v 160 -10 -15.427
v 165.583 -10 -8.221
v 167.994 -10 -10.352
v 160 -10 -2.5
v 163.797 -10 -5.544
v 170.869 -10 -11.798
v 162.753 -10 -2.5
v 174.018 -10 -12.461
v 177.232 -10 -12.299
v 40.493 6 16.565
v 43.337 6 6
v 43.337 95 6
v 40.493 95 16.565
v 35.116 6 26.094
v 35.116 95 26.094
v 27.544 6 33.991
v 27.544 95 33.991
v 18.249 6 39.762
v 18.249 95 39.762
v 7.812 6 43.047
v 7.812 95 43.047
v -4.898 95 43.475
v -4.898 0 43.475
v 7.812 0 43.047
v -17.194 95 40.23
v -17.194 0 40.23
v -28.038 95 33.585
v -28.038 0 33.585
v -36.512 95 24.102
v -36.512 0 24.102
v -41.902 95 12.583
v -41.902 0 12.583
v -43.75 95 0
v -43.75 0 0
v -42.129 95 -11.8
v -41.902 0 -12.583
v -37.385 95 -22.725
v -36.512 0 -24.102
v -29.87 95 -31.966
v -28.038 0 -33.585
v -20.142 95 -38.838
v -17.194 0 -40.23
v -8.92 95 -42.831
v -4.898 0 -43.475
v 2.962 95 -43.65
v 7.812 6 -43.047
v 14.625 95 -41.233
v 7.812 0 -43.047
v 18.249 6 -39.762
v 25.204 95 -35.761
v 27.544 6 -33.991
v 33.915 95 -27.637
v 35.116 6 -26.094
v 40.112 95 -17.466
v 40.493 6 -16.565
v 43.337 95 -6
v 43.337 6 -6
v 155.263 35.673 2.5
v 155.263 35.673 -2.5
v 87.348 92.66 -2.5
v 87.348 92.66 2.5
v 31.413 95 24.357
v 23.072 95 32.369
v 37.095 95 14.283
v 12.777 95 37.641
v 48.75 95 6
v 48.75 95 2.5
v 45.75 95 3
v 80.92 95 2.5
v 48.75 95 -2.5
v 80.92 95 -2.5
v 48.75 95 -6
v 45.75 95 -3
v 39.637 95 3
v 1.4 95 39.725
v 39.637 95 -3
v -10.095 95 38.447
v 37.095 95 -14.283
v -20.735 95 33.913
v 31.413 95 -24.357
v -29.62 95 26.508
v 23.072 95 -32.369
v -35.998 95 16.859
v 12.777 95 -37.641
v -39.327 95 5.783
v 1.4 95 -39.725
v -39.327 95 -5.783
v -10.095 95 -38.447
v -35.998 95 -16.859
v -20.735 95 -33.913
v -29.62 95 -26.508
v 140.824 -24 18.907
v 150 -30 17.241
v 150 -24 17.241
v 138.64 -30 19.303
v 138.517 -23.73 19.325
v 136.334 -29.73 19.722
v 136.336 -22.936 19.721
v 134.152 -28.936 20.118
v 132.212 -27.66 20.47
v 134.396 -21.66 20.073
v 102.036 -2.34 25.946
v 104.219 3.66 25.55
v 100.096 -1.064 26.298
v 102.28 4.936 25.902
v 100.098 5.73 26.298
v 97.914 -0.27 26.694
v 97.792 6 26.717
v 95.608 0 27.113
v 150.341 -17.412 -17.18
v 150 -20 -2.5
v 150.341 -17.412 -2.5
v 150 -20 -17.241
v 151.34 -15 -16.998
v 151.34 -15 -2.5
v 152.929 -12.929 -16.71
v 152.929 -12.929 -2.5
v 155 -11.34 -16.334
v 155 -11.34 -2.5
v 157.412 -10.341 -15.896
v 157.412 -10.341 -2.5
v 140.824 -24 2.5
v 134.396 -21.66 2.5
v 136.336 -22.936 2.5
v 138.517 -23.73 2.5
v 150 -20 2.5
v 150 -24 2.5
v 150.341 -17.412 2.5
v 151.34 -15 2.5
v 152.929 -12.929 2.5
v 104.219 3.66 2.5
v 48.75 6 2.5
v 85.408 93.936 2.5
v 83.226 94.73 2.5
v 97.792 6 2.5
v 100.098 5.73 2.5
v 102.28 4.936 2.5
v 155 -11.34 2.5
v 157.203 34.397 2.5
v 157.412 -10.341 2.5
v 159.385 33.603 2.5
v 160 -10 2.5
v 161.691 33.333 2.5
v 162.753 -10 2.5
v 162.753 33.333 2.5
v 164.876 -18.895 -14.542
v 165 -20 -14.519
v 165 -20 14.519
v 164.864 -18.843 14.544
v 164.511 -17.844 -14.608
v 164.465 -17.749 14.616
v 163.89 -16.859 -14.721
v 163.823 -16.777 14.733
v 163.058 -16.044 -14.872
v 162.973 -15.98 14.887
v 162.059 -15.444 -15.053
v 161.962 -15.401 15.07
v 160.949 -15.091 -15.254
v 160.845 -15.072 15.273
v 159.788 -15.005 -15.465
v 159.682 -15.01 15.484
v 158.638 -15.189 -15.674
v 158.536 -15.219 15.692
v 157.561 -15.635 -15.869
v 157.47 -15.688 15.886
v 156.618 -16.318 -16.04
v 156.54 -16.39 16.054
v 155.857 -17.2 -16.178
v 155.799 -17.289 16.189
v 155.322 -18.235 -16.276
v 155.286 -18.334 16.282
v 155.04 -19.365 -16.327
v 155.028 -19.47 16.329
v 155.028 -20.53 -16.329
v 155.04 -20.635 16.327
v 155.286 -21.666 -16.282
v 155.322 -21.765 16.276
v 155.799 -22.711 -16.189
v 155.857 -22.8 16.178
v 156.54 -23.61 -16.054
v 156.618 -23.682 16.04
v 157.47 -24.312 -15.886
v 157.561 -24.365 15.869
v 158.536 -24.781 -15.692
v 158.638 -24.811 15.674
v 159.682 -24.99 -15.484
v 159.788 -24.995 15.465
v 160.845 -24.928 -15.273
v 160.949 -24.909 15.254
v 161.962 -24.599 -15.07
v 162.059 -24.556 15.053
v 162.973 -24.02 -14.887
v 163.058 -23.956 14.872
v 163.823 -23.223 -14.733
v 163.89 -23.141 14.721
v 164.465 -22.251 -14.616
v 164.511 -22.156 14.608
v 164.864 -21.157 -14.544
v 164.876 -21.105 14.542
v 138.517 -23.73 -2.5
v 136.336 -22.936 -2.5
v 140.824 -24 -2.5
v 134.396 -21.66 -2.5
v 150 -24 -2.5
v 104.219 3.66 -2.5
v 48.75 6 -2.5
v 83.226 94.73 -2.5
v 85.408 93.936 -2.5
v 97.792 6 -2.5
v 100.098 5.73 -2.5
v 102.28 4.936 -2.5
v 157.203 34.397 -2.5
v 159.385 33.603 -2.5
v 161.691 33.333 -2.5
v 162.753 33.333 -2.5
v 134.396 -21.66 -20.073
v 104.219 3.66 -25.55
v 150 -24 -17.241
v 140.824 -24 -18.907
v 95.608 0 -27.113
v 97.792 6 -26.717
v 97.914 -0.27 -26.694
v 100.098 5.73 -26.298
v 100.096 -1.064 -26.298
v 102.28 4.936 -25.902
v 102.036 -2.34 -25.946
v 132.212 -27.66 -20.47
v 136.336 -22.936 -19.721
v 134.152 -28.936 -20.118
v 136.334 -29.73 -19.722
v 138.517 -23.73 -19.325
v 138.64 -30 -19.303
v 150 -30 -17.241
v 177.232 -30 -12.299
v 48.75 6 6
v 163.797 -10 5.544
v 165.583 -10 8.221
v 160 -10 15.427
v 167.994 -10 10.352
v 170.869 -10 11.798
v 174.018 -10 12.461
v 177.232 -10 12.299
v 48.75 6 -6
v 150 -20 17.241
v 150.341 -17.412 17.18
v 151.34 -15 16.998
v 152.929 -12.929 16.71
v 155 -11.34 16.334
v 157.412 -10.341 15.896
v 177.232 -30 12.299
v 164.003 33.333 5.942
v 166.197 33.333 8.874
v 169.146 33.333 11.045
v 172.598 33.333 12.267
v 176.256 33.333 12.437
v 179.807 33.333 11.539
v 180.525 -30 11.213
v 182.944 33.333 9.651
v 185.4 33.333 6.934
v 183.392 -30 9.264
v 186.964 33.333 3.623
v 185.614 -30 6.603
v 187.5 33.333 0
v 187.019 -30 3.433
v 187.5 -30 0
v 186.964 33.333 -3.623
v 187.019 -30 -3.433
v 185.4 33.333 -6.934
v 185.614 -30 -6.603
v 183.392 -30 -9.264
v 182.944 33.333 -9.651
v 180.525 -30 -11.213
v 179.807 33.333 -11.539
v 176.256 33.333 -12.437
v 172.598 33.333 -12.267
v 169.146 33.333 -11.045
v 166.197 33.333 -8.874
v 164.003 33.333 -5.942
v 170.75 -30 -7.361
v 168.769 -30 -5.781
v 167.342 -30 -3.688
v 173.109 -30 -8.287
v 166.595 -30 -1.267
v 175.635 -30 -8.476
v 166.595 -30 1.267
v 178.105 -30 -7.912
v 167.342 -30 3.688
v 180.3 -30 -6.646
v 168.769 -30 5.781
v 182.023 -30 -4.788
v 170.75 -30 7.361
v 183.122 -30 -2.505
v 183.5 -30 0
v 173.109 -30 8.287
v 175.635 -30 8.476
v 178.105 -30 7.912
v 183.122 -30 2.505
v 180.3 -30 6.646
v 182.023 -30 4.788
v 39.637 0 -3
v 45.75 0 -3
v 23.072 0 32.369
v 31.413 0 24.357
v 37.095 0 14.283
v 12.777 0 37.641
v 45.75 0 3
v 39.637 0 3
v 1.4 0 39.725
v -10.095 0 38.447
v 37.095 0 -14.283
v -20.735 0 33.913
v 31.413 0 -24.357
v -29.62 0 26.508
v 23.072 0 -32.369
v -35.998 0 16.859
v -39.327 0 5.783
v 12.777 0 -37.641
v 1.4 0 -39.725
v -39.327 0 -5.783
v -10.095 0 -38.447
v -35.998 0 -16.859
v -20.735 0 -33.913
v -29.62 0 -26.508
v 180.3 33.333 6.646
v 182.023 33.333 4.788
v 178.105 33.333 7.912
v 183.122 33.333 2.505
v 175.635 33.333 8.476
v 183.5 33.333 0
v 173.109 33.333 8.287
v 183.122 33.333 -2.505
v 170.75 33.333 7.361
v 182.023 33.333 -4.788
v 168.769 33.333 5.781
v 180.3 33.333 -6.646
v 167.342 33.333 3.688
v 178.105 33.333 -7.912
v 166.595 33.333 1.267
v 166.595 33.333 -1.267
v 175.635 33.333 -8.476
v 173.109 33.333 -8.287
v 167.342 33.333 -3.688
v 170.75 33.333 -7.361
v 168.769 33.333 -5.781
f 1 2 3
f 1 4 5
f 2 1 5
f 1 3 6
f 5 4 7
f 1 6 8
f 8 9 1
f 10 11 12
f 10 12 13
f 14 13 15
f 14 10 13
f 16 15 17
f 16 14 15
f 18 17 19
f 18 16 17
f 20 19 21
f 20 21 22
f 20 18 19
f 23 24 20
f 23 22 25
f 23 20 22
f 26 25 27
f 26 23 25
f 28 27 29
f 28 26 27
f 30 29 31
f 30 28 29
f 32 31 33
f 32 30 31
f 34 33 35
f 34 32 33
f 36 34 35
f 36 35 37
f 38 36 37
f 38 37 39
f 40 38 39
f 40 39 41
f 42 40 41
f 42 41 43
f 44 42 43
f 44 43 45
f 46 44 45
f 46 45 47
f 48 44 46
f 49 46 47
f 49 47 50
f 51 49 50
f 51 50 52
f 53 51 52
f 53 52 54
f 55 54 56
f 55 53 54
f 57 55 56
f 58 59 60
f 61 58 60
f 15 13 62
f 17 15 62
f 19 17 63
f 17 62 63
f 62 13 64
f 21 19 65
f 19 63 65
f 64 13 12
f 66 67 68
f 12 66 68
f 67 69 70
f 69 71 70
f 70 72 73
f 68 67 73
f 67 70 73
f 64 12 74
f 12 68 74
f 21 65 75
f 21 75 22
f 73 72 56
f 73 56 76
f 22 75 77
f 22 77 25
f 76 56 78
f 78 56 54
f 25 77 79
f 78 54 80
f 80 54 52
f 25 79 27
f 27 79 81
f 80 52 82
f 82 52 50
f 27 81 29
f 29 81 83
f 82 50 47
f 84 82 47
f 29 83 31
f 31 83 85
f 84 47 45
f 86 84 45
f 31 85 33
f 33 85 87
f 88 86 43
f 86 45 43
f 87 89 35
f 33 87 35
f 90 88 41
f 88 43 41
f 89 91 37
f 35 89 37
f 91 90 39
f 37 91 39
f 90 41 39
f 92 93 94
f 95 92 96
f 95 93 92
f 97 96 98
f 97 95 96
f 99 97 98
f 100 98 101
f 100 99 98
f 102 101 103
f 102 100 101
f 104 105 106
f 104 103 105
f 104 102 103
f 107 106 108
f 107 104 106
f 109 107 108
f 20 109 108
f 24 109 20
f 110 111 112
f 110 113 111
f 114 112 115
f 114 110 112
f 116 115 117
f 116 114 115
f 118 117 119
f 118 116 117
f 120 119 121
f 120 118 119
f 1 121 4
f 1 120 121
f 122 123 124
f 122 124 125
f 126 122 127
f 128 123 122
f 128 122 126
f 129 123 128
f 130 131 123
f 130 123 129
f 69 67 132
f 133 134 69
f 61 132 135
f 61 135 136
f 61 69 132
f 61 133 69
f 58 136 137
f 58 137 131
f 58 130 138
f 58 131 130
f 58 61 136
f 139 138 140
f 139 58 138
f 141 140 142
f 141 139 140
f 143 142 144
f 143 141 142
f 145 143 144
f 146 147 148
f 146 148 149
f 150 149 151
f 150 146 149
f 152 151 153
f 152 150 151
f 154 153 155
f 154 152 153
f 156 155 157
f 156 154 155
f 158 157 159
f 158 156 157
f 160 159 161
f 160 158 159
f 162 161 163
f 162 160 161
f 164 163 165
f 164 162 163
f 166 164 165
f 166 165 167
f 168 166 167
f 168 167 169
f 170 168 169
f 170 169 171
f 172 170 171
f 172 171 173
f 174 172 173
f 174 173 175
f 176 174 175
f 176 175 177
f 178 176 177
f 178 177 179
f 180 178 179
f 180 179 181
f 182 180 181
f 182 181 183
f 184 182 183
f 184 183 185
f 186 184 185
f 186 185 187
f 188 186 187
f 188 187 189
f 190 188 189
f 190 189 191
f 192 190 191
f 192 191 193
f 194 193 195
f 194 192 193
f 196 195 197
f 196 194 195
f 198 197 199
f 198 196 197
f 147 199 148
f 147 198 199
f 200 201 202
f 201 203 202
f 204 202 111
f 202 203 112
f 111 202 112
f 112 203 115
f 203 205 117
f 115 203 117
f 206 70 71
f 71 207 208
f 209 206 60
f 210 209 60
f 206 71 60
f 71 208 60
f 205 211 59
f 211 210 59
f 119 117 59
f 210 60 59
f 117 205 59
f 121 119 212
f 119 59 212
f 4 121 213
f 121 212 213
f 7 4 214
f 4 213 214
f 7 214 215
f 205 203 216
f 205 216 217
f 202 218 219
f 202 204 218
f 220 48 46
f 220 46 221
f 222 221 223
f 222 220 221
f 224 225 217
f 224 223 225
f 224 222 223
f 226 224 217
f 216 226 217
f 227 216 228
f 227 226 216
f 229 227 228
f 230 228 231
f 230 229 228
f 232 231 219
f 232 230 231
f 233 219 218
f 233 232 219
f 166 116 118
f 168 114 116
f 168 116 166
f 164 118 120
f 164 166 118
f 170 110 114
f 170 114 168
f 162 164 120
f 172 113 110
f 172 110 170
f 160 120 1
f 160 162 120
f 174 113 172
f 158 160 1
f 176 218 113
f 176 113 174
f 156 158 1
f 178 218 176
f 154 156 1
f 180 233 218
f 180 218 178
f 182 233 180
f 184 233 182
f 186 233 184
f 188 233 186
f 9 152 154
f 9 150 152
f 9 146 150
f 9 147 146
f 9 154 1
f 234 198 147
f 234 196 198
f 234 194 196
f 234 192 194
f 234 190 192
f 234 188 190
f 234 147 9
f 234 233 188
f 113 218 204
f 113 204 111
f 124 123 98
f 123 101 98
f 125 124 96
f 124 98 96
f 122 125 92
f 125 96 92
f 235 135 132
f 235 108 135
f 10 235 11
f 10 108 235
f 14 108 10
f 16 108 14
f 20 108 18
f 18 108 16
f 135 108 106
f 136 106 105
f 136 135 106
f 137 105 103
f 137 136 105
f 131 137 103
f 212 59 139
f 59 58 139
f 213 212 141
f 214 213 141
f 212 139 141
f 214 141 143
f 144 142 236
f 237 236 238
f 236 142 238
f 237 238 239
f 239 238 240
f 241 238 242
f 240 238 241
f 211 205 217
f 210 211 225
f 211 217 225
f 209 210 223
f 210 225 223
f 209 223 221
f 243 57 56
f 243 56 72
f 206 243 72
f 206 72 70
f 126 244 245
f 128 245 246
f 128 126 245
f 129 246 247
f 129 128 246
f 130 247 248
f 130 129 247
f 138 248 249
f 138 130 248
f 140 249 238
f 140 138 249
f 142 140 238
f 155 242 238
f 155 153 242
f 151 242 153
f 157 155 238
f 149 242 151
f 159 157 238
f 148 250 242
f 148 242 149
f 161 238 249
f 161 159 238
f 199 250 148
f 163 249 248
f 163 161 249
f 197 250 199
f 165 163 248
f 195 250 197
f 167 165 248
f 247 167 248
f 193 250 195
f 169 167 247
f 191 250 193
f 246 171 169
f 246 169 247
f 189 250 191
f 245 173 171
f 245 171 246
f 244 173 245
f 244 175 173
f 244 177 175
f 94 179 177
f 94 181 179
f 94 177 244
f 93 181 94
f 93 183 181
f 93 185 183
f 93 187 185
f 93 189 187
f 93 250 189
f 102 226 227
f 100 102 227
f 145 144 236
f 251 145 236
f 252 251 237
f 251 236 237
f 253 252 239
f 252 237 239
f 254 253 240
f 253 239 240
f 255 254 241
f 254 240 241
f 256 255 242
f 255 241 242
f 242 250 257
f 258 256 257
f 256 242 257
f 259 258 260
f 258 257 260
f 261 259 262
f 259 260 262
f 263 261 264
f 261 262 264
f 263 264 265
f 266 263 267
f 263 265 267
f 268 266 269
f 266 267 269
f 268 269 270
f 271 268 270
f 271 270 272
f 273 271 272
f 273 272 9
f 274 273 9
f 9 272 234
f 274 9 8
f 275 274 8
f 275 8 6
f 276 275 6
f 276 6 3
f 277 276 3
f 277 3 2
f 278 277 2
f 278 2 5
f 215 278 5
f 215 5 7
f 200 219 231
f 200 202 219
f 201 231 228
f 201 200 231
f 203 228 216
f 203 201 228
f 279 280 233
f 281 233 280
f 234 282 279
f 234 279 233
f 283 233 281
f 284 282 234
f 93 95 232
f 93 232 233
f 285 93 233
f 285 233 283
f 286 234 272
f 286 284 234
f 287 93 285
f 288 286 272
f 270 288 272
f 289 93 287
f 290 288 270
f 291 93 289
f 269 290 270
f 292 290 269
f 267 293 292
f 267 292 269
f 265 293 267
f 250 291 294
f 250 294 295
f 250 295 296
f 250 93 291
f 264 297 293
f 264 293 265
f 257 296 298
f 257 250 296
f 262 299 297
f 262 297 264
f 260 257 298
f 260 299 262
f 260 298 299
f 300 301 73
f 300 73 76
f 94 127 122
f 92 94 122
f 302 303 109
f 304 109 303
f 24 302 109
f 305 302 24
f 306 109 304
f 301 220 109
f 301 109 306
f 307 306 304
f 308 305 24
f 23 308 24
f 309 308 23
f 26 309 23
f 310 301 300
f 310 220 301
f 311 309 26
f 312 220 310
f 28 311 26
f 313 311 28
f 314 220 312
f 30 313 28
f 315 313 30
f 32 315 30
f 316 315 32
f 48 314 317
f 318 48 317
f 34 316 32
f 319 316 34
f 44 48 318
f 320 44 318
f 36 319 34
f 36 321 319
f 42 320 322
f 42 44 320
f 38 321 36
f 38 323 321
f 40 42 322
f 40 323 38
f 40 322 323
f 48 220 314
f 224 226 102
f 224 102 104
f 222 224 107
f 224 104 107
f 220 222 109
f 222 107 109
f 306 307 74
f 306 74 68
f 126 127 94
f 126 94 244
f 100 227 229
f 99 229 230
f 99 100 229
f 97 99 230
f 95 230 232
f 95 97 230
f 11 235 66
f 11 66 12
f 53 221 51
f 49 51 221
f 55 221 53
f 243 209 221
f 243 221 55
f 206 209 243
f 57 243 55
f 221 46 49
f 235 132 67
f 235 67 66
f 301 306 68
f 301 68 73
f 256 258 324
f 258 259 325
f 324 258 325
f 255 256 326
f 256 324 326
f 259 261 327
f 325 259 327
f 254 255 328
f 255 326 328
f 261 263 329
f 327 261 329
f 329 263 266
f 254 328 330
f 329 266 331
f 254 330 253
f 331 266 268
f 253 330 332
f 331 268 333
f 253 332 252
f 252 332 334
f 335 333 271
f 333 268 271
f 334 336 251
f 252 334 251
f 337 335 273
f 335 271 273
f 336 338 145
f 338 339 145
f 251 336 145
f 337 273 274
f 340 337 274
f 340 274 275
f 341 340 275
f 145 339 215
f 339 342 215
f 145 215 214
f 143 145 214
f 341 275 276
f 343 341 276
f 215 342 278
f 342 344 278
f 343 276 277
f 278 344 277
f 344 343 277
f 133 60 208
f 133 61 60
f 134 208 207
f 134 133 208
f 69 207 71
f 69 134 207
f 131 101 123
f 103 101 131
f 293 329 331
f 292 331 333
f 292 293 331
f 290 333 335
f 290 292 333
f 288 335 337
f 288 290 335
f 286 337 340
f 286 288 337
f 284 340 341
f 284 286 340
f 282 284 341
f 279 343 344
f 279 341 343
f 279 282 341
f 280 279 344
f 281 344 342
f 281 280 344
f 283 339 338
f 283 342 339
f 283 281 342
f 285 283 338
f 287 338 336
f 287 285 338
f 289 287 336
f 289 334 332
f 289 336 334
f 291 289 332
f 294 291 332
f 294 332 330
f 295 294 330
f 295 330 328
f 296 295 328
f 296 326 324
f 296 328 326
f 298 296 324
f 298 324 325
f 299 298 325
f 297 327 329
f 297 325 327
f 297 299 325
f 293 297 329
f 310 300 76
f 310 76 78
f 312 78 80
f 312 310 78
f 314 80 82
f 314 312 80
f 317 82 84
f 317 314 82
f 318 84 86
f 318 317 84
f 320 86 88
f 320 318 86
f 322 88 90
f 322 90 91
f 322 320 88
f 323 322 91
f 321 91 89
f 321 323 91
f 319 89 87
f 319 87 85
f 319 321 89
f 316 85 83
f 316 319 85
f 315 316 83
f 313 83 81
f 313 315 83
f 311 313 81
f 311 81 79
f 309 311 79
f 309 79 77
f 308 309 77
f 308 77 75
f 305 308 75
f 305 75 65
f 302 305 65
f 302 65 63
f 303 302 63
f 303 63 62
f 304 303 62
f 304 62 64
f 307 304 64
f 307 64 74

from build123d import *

# Parameters (mm, degrees)
BOSS_EXTRUDE1_DEPTH     = 95
BOSS_EXTRUDE2_START     = -30
SKETCH2_3_R             = 12.5
BOSS_EXTRUDE2_DEPTH     = 63.333333333
EXTRUDE_THIN1_DEPTH     = 115
SKETCH5_W               = 50
SKETCH5_H               = 20
BOSS_EXTRUDE3_DEPTH     = 230
CUT_EXTRUDE2_DEPTH      = 320.256949807
CUT_EXTRUDE2_DEPTH_BACK = 320.256949807
SKETCH5_3_R             = 5
CUT_EXTRUDE1_START      = -30
CUT_EXTRUDE1_OUTLINE_R  = 8.5
CUT_EXTRUDE1_DEPTH      = 125
RIB1_START              = -2.5
RIB1_DEPTH              = 5
FILLET1_R               = 10


# Read off the part's stored shape, not the designer's step: Cut-Extrude1, Rib1
with BuildPart() as part:
    # Sketch2 → Boss-Extrude1 (new body)
    with BuildSketch(Plane(origin=(0, 0, 0), x_dir=(1, 0, 0), z_dir=(0, 1, 0))):
        with BuildLine():
            Line((43.336618465, 6), (48.75, 6))
            Line((48.75, 6), (48.75, -6))
            Line((48.75, -6), (43.336618465, -6))
            ThreePointArc((43.336618465, -6), (-43.75, 0), (43.336618465, 6))
        make_face()
    extrude(amount=BOSS_EXTRUDE1_DEPTH)



with BuildPart() as body_2:
    # Sketch2<3> → Boss-Extrude2 (new body)
    with BuildSketch(Plane(origin=(0, 0, 0), x_dir=(1, 0, 0), z_dir=(0, 1, 0)).offset(BOSS_EXTRUDE2_START)):
        with Locations(Location((175, 0, 0), (0, 0, 270))):
            Circle(SKETCH2_3_R)
    extrude(amount=BOSS_EXTRUDE2_DEPTH)


with BuildPart() as part_1:
    add(part.part)

    add(body_2.part)  # Extrude-Thin1 merges body 2
    # Sketch3 → Extrude-Thin1 (add, symmetric)
    with BuildSketch(Plane.XY):
        Polygon((-43.75, 0), (99.247392222, 0), (135, -30), (187.5, -30), (187.5, -24), (137.183821406, -24), (101.431213628, 6), (-43.75, 6), align=None)
    extrude(amount=EXTRUDE_THIN1_DEPTH, both=True)

    # Sketch5 → Boss-Extrude3 (add)
    with BuildSketch(Plane.XY.offset(115)):
        with Locations((175, -20)):
            Rectangle(SKETCH5_W, SKETCH5_H)
    extrude(amount=-BOSS_EXTRUDE3_DEPTH)

    # Sketch5<3> → Cut-Extrude2 (cut, two sides: drawn at the far end of the back side and taken through both)
    with BuildSketch(Plane.XY.offset(115).offset(-CUT_EXTRUDE2_DEPTH_BACK)):
        with Locations((160, -20)):
            Circle(SKETCH5_3_R)
    extrude(amount=CUT_EXTRUDE2_DEPTH + CUT_EXTRUDE2_DEPTH_BACK, mode=Mode.SUBTRACT)

    # Cut-Extrude1 outline → Cut-Extrude1 (cut)
    with BuildSketch(Plane(origin=(0, 0, 0), x_dir=(1, 0, 0), z_dir=(0, 1, 0)).offset(CUT_EXTRUDE1_START)):
        with BuildLine():
            ThreePointArc((177.232142857, 12.299086887), (184.59561842, 8.010874306), (187.5, 0))
            ThreePointArc((187.5, 0), (184.59561842, -8.010874306), (177.232142857, -12.299086887))
            Line((177.232142857, -12.299086887), (150, -17.241407705))
            Line((150, -17.241407705), (150, -115))
            Line((150, -115), (200, -115))
            Line((200, -115), (200, 115))
            Line((200, 115), (150, 115))
            Line((150, 115), (150, 17.241407705))
            Line((150, 17.241407705), (177.232142857, 12.299086887))
        make_face()
        with BuildLine():
            Line((7.8125, 43.046804106), (150, 17.241407705))
            Line((150, 17.241407705), (150, 115))
            Line((150, 115), (-43.75, 115))
            Line((-43.75, 115), (-43.75, -4.5e-08))
            ThreePointArc((-43.75, -4.5e-08), (-28.038060087, 33.584664455), (7.8125, 43.046804106))
        make_face()
        with BuildLine():
            Line((150, -115), (150, -17.241407705))
            Line((150, -17.241407705), (7.8125, -43.046804106))
            ThreePointArc((7.8125, -43.046804106), (-28.038060053, -33.584664483), (-43.75, -4.5e-08))
            Line((-43.75, -4.5e-08), (-43.75, -115))
            Line((-43.75, -115), (150, -115))
        make_face()
        with Locations((175, 0)):
            Circle(CUT_EXTRUDE1_OUTLINE_R)
        with BuildLine():
            Line((45.75, 3), (39.636630785, 3))
            ThreePointArc((39.636630785, 3), (-39.75, 0), (39.636630785, -3))
            Line((39.636630785, -3), (45.75, -3))
            Line((45.75, -3), (45.75, 3))
        make_face()
    extrude(amount=CUT_EXTRUDE1_DEPTH, mode=Mode.SUBTRACT)

    # Rib1 outline → Rib1 (add)
    with BuildSketch(Plane.XY.offset(RIB1_START)):
        Polygon((158.05144817, 33.333333333), (84.559976627, 95), (48.75, 95), (48.75, 6), (101.431213628, 6), (137.183821406, -24), (150, -24), (150, -10), (164, -10), (164, 33.333333333), align=None)
    extrude(amount=RIB1_DEPTH)

    # Fillet1
    fillet1_edges = [part_1.edges().sort_by_distance(p)[0] for p in [
        (150, -10, 9.870703853),
        (137.183821406, -24, -11.033698381),
        (101.431213628, 6, -14.278041998),
        (158.05144817, 33.333333333, 0),
        (84.559976627, 95, 0),
        (150, -10, -9.870703853),
        (99.247392222, 0, 0),
        (101.431213628, 6, 14.278041998),
        (137.183821406, -24, 11.033698381),
        (135, -30, 0),
    ]]
    fillet(fillet1_edges, radius=FILLET1_R)


solid = part_1.part
